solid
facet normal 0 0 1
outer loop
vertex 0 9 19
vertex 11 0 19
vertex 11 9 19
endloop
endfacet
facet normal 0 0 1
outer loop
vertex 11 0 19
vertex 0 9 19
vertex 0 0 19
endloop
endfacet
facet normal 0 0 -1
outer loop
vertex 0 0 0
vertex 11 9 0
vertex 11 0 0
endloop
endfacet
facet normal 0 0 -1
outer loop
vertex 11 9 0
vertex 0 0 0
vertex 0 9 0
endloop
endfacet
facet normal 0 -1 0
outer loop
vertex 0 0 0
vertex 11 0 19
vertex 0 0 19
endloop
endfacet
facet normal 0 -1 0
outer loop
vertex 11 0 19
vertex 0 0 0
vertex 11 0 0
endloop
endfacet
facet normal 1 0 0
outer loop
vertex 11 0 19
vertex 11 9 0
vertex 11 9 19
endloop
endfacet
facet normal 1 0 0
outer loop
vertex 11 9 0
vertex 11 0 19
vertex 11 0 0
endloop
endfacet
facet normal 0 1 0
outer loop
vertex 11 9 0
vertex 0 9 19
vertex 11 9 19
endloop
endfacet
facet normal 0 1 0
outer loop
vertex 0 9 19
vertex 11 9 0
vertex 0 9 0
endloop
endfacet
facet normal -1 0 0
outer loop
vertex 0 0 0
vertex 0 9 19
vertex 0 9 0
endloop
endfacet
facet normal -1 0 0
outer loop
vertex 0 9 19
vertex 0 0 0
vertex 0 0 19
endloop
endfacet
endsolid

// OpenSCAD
// Generated by SolidPython 1.0.1 on 2020-07-29 00:46:55


cube(size = [11, 9, 19]);
/***********************************************
*********      SolidPython code:      **********
************************************************
 
# import packages: SolidPython
from solid import *
from solid.utils import *
from itertools import chain, combinations, permutations


class Resize:

    def __init__(self, scad_file):
        self.scad_file = scad_file
        #self.scad_file = import_scad(scad_file)
        # cone/cylinder param:
        self.r1 = 0
        self.r2 = 0
        self.h = 0
        # rectangular prism param:
        self.w = 0
        self.l = 0
        # ellipse param:
        self.r = 0

    # import OpenScad code (file name corresponds to shape)


    # classify shape + parameters
    def assign(self, param1, param2, param3):
        if self.scad_file == 'cone.scad':
            self.r1 = param1
            self.r2 = param2
            self.h = param3
        elif self.scad_file == 'cylinder.scad':
            self.r1 = param1
            self.r2 = param2
            self.h = param3
        elif self.scad_file == 'rectangularPrism.scad':
            self.h = param1
            self.l = param2
            self.w = param3
        else:
            self.r = param1
            self.h = param2

    # resize parameters
    def iterate(self):
        x = range(3, 20, 2)
        i = 1
        if self.scad_file == 'cone.scad':
            tempList = list(permutations(x, 2))
            for temp in tempList:
                param1 = temp[0]
                param2 = temp[1]
                filepath = 'produced_scad_files/' + 'cone' + str(param1) + '_' + str(param2) + '_' + '.scad'
                scad_render_to_file(cylinder(h=param1, r1=param2, r2=0), filepath)

        elif self.scad_file == 'cylinder.scad':
            tempList = list(permutations(x, 3))
            for temp in tempList:
                param1 = temp[0]
                param2 = temp[1]
                filepath = 'produced_scad_files/' + 'cylinder' + str(param1) + '_' + str(param2) + '_' + '.scad'
                scad_render_to_file(cylinder(h=param1, r1=param2, r2=param2), filepath)

        elif self.scad_file == 'rectangularPrism.scad':
            tempList = list(permutations(x, 3))
            for temp in tempList:
                param1 = temp[0]
                param2 = temp[1]
                param3 = temp[2]
                filepath = 'produced_scad_files/' + 'rectangularPrism' + str(param1) + '_' + str(param2) + '_' + str(
                    param3) + '.scad'
                scad_render_to_file(cube(size=(param1, param2, param3)), filepath)

        elif self.scad_file == 'ellipse.scad':
            tempList = list(permutations(x, 4))
            for temp in tempList:
                param1 = temp[0]
                param2 = temp[1]
                param3 = temp[2]
                param4 = temp[3]
                filepath = 'produced_scad_files/' + 'ellipse' + str(param1) + '_' + str(param2) + '_' + str(param3) + '_' + str(param4) + '.scad'
                scad_render_to_file(scale([param1, param2, param3])(sphere(r=param4)), filepath)

    def render_to_scadfile(self):
        scad_render_to_file(scad, 'example.scad') 
 
************************************************/
